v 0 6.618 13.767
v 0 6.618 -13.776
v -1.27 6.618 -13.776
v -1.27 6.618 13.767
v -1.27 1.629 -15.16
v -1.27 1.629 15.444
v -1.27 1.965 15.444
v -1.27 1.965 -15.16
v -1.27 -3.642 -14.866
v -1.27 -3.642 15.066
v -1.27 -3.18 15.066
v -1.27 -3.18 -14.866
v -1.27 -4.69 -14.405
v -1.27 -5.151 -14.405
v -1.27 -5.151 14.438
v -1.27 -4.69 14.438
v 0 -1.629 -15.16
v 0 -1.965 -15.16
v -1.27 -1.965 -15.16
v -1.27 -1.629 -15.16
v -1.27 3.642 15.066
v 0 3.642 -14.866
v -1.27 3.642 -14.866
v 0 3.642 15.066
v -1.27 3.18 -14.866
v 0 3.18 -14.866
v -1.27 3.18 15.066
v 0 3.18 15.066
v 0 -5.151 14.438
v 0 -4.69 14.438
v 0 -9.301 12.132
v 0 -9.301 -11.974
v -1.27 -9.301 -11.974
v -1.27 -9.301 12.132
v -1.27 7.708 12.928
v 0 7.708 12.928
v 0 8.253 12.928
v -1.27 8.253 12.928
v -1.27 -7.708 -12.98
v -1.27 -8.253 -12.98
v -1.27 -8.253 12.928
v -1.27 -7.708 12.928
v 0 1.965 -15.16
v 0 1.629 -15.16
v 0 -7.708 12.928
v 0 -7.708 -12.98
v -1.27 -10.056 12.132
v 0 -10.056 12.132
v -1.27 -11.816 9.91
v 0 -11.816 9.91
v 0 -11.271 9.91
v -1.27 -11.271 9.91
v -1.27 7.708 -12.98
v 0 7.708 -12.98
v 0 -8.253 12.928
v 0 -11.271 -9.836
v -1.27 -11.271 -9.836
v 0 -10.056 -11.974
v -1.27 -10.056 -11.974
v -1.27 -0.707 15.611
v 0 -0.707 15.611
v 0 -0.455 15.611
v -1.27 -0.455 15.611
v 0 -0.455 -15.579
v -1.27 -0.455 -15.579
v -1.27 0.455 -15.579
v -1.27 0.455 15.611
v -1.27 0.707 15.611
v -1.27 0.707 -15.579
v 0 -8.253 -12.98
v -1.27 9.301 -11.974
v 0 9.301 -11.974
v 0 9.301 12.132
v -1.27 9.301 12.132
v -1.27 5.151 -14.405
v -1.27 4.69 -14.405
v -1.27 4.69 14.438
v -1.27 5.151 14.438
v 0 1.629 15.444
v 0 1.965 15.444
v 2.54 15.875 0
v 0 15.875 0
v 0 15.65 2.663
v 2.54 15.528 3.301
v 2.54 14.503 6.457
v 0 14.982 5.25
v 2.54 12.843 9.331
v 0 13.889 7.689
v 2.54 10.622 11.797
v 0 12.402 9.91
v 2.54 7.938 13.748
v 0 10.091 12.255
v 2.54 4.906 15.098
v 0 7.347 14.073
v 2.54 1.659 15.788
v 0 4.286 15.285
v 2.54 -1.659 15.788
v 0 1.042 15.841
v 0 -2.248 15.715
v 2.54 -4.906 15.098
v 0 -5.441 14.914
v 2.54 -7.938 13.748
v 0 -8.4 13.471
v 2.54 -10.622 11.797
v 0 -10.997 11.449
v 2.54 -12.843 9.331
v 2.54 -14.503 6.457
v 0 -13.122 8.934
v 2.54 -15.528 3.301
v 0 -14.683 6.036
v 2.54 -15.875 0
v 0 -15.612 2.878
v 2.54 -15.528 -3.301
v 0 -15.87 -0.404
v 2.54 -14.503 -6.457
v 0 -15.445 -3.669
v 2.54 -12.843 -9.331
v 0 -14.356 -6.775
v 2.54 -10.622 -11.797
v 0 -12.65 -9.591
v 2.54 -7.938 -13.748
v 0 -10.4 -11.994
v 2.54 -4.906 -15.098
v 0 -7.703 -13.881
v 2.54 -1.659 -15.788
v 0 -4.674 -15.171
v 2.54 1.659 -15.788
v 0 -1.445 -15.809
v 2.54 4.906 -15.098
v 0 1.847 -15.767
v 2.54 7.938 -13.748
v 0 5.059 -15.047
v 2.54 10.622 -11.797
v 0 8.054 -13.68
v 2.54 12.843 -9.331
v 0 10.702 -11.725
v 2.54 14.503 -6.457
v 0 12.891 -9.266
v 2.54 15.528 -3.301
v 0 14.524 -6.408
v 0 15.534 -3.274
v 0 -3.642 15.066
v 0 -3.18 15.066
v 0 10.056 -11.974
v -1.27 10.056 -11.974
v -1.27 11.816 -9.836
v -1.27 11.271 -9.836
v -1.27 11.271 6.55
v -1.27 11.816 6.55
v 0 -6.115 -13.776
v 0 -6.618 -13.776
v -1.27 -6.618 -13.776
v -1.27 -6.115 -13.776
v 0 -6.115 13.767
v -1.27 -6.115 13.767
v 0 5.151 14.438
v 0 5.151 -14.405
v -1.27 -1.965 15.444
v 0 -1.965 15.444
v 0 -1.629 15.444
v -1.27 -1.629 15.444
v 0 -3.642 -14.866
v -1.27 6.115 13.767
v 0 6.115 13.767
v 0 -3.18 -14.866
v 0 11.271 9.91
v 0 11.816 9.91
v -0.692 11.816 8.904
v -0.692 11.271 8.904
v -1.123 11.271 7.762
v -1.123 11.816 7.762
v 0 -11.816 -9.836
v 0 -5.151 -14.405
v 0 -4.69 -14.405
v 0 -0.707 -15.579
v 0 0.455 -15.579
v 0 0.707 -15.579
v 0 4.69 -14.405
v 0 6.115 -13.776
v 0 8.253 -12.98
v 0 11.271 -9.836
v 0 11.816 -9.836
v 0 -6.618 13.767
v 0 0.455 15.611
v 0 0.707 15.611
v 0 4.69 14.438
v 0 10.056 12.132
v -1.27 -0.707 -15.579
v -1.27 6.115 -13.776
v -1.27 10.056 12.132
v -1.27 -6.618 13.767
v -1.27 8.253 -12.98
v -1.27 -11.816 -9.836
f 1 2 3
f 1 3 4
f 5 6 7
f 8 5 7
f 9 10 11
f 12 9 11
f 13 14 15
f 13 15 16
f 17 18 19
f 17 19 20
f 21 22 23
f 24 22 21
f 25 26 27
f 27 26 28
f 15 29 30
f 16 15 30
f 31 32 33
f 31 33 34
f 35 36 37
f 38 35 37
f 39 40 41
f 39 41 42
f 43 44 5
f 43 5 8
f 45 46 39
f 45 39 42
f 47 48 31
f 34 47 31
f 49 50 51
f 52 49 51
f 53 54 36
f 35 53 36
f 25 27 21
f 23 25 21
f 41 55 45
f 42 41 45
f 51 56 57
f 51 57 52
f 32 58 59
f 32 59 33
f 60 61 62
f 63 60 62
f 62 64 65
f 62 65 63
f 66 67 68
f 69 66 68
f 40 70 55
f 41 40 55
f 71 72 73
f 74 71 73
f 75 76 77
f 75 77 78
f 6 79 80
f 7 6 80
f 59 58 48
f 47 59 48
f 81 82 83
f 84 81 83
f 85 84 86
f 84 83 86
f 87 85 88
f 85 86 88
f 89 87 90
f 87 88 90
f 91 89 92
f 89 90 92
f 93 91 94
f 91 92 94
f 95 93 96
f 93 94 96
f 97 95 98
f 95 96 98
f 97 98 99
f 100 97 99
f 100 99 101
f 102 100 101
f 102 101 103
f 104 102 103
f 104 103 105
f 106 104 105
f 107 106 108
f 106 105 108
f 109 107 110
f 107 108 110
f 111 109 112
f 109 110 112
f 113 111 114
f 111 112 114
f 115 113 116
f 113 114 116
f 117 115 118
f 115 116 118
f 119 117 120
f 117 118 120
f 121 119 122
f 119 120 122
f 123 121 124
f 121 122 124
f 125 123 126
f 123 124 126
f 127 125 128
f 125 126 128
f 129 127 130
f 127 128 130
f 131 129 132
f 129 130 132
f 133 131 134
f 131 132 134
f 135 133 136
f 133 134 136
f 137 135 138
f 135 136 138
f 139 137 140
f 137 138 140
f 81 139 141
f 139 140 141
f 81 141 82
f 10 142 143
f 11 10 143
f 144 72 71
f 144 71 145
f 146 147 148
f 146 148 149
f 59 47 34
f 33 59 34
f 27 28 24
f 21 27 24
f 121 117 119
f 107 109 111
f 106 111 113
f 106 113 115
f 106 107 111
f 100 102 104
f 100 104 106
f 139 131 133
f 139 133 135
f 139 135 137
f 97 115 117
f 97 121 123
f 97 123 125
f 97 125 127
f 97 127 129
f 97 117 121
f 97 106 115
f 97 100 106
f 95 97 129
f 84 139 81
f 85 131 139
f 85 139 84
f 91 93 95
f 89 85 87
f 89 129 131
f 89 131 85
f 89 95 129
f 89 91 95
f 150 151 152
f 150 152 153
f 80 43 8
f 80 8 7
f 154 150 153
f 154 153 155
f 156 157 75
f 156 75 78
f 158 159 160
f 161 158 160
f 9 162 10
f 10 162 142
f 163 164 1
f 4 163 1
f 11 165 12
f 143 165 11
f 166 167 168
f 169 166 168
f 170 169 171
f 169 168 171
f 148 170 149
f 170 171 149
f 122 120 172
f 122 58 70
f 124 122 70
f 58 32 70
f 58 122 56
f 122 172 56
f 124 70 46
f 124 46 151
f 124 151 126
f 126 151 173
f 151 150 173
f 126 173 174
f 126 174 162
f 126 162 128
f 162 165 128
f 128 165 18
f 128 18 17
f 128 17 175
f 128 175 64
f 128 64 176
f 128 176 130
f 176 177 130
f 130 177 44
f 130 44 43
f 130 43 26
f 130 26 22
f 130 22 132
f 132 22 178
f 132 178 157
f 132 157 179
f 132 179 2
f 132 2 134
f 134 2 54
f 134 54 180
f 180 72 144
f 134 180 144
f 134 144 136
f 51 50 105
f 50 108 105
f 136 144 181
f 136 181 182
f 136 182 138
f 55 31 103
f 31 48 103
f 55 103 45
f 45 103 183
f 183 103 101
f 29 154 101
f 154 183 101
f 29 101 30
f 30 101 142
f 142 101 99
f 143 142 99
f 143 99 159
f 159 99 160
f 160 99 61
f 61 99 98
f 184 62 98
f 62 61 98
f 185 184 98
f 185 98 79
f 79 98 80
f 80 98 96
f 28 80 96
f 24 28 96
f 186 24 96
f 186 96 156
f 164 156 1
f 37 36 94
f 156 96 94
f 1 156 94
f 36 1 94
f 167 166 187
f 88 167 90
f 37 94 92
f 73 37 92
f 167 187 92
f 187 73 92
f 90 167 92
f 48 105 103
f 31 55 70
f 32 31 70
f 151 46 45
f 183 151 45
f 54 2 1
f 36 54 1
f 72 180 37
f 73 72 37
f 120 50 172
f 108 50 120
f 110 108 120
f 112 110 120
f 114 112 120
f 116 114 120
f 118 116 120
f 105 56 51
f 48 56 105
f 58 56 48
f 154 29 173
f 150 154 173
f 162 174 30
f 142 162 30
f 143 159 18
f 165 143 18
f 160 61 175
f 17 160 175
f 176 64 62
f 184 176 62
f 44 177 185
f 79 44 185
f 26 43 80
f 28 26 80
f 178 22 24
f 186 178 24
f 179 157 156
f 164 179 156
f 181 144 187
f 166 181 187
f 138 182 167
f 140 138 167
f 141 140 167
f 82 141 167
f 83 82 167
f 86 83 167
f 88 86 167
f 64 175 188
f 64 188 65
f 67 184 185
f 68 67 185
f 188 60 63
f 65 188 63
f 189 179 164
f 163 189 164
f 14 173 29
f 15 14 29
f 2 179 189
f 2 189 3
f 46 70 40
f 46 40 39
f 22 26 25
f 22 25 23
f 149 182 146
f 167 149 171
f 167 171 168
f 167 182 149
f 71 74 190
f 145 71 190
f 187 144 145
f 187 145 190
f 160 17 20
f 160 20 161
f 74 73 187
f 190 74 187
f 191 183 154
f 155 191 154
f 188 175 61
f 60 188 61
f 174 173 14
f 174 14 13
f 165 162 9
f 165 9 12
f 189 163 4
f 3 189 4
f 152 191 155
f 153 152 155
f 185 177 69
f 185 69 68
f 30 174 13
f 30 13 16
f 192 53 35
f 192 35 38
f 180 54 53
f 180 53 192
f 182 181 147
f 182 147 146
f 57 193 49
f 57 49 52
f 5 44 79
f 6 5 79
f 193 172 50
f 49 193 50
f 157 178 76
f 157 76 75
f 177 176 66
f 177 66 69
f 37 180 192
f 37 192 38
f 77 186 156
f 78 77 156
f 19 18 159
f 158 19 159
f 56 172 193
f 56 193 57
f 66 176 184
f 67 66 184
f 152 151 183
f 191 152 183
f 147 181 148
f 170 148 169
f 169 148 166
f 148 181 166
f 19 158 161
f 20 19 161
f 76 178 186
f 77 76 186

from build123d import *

# Parameters (mm, degrees)
F0_R        = 15.875
F1_DEPTH    = 2.54
F2_W        = 0.2515364613
F2_H        = 31.190475449
F2_W_2      = 0.335381832
F2_H_2      = 30.6035578251
F2_W_3      = 0.4611494951
F2_H_3      = 29.9327941611
F2_H_4      = 28.8428049535
F2_W_4      = 0.5030720495
F2_H_5      = 27.5432020426
F2_W_5      = 0.5449950695
F2_H_6      = 25.9082177654
F2_W_6      = 0.7546087727
F2_H_7      = 24.1055423394
F2_H_8      = 19.7455827147
F3_DEPTH    = 1.27
F4_T1_DEPTH = 8.9452554821


# Not quite as in the source:
# - a fillet or chamfer that OpenCascade refuses, or shapes differently, is made with other operations: its cross-section is extruded or revolved along the edge and cut away or added


with BuildPart() as f1:
    # F0 (on Right) → F1 (new body)
    with BuildSketch(Plane.YZ):
        Circle(F0_R)
    extrude(amount=F1_DEPTH)

    # F2 (on Right) → F3 (join)
    with BuildSketch(Plane.YZ):
        with Locations((-0.5812076997, 0.0161286443)):
            Rectangle(F2_W, F2_H)
        with Locations((-1.7969654873, 0.1418972388)):
            Rectangle(F2_W_2, F2_H_2)
        with Locations((-3.4109887201, 0.0999742188)):
            Rectangle(F2_W_3, F2_H_3)
        with Locations((-4.9202053342, 0.0161286443)):
            Rectangle(F2_W_3, F2_H_4)
        with Locations((-6.366537651, -0.0048326328)):
            Rectangle(F2_W_4, F2_H_5)
        with Locations((-7.9805608839, -0.0257934444)):
            Rectangle(F2_W_5, F2_H_6)
        with Locations((-9.6784294583, 0.0790129416)):
            Rectangle(F2_W_6, F2_H_7)
        with Locations((-11.5439891815, 0.0370899215)):
            Rectangle(F2_W_5, F2_H_8)
        with Locations((0.5812076997, 0.0161286443)):
            Rectangle(F2_W, F2_H)
        with Locations((11.5439891815, 0.0370899215)):
            Rectangle(F2_W_5, F2_H_8)
        with Locations((1.7969654873, 0.1418972388)):
            Rectangle(F2_W_2, F2_H_2)
        with Locations((3.4109887201, 0.0999742188)):
            Rectangle(F2_W_3, F2_H_3)
        with Locations((4.9202053342, 0.0161286443)):
            Rectangle(F2_W_3, F2_H_4)
        with Locations((9.6784294583, 0.0790129416)):
            Rectangle(F2_W_6, F2_H_7)
        with Locations((7.9805608839, -0.0257934444)):
            Rectangle(F2_W_5, F2_H_6)
        with Locations((6.366537651, -0.0048326328)):
            Rectangle(F2_W_4, F2_H_5)
    extrude(amount=-F3_DEPTH)

    # F4: fillet of radius 5.08 on 1 edges, made by hand

    # F4_s2 → F4_t1 (cut)
    with BuildSketch(Plane.XZ.offset(-20.2167471289)):
        with BuildLine():
            ThreePointArc((0, 9.9098812789), (-0.9419048812, 8.345828338), (-1.27, 6.5497771138))
            Line((-1.27, 6.5497771138), (-1.27, 9.9098812789))
            Line((-1.27, 9.9098812789), (0, 9.9098812789))
        make_face()
    extrude(amount=F4_T1_DEPTH, mode=Mode.SUBTRACT)


solid = f1.part
